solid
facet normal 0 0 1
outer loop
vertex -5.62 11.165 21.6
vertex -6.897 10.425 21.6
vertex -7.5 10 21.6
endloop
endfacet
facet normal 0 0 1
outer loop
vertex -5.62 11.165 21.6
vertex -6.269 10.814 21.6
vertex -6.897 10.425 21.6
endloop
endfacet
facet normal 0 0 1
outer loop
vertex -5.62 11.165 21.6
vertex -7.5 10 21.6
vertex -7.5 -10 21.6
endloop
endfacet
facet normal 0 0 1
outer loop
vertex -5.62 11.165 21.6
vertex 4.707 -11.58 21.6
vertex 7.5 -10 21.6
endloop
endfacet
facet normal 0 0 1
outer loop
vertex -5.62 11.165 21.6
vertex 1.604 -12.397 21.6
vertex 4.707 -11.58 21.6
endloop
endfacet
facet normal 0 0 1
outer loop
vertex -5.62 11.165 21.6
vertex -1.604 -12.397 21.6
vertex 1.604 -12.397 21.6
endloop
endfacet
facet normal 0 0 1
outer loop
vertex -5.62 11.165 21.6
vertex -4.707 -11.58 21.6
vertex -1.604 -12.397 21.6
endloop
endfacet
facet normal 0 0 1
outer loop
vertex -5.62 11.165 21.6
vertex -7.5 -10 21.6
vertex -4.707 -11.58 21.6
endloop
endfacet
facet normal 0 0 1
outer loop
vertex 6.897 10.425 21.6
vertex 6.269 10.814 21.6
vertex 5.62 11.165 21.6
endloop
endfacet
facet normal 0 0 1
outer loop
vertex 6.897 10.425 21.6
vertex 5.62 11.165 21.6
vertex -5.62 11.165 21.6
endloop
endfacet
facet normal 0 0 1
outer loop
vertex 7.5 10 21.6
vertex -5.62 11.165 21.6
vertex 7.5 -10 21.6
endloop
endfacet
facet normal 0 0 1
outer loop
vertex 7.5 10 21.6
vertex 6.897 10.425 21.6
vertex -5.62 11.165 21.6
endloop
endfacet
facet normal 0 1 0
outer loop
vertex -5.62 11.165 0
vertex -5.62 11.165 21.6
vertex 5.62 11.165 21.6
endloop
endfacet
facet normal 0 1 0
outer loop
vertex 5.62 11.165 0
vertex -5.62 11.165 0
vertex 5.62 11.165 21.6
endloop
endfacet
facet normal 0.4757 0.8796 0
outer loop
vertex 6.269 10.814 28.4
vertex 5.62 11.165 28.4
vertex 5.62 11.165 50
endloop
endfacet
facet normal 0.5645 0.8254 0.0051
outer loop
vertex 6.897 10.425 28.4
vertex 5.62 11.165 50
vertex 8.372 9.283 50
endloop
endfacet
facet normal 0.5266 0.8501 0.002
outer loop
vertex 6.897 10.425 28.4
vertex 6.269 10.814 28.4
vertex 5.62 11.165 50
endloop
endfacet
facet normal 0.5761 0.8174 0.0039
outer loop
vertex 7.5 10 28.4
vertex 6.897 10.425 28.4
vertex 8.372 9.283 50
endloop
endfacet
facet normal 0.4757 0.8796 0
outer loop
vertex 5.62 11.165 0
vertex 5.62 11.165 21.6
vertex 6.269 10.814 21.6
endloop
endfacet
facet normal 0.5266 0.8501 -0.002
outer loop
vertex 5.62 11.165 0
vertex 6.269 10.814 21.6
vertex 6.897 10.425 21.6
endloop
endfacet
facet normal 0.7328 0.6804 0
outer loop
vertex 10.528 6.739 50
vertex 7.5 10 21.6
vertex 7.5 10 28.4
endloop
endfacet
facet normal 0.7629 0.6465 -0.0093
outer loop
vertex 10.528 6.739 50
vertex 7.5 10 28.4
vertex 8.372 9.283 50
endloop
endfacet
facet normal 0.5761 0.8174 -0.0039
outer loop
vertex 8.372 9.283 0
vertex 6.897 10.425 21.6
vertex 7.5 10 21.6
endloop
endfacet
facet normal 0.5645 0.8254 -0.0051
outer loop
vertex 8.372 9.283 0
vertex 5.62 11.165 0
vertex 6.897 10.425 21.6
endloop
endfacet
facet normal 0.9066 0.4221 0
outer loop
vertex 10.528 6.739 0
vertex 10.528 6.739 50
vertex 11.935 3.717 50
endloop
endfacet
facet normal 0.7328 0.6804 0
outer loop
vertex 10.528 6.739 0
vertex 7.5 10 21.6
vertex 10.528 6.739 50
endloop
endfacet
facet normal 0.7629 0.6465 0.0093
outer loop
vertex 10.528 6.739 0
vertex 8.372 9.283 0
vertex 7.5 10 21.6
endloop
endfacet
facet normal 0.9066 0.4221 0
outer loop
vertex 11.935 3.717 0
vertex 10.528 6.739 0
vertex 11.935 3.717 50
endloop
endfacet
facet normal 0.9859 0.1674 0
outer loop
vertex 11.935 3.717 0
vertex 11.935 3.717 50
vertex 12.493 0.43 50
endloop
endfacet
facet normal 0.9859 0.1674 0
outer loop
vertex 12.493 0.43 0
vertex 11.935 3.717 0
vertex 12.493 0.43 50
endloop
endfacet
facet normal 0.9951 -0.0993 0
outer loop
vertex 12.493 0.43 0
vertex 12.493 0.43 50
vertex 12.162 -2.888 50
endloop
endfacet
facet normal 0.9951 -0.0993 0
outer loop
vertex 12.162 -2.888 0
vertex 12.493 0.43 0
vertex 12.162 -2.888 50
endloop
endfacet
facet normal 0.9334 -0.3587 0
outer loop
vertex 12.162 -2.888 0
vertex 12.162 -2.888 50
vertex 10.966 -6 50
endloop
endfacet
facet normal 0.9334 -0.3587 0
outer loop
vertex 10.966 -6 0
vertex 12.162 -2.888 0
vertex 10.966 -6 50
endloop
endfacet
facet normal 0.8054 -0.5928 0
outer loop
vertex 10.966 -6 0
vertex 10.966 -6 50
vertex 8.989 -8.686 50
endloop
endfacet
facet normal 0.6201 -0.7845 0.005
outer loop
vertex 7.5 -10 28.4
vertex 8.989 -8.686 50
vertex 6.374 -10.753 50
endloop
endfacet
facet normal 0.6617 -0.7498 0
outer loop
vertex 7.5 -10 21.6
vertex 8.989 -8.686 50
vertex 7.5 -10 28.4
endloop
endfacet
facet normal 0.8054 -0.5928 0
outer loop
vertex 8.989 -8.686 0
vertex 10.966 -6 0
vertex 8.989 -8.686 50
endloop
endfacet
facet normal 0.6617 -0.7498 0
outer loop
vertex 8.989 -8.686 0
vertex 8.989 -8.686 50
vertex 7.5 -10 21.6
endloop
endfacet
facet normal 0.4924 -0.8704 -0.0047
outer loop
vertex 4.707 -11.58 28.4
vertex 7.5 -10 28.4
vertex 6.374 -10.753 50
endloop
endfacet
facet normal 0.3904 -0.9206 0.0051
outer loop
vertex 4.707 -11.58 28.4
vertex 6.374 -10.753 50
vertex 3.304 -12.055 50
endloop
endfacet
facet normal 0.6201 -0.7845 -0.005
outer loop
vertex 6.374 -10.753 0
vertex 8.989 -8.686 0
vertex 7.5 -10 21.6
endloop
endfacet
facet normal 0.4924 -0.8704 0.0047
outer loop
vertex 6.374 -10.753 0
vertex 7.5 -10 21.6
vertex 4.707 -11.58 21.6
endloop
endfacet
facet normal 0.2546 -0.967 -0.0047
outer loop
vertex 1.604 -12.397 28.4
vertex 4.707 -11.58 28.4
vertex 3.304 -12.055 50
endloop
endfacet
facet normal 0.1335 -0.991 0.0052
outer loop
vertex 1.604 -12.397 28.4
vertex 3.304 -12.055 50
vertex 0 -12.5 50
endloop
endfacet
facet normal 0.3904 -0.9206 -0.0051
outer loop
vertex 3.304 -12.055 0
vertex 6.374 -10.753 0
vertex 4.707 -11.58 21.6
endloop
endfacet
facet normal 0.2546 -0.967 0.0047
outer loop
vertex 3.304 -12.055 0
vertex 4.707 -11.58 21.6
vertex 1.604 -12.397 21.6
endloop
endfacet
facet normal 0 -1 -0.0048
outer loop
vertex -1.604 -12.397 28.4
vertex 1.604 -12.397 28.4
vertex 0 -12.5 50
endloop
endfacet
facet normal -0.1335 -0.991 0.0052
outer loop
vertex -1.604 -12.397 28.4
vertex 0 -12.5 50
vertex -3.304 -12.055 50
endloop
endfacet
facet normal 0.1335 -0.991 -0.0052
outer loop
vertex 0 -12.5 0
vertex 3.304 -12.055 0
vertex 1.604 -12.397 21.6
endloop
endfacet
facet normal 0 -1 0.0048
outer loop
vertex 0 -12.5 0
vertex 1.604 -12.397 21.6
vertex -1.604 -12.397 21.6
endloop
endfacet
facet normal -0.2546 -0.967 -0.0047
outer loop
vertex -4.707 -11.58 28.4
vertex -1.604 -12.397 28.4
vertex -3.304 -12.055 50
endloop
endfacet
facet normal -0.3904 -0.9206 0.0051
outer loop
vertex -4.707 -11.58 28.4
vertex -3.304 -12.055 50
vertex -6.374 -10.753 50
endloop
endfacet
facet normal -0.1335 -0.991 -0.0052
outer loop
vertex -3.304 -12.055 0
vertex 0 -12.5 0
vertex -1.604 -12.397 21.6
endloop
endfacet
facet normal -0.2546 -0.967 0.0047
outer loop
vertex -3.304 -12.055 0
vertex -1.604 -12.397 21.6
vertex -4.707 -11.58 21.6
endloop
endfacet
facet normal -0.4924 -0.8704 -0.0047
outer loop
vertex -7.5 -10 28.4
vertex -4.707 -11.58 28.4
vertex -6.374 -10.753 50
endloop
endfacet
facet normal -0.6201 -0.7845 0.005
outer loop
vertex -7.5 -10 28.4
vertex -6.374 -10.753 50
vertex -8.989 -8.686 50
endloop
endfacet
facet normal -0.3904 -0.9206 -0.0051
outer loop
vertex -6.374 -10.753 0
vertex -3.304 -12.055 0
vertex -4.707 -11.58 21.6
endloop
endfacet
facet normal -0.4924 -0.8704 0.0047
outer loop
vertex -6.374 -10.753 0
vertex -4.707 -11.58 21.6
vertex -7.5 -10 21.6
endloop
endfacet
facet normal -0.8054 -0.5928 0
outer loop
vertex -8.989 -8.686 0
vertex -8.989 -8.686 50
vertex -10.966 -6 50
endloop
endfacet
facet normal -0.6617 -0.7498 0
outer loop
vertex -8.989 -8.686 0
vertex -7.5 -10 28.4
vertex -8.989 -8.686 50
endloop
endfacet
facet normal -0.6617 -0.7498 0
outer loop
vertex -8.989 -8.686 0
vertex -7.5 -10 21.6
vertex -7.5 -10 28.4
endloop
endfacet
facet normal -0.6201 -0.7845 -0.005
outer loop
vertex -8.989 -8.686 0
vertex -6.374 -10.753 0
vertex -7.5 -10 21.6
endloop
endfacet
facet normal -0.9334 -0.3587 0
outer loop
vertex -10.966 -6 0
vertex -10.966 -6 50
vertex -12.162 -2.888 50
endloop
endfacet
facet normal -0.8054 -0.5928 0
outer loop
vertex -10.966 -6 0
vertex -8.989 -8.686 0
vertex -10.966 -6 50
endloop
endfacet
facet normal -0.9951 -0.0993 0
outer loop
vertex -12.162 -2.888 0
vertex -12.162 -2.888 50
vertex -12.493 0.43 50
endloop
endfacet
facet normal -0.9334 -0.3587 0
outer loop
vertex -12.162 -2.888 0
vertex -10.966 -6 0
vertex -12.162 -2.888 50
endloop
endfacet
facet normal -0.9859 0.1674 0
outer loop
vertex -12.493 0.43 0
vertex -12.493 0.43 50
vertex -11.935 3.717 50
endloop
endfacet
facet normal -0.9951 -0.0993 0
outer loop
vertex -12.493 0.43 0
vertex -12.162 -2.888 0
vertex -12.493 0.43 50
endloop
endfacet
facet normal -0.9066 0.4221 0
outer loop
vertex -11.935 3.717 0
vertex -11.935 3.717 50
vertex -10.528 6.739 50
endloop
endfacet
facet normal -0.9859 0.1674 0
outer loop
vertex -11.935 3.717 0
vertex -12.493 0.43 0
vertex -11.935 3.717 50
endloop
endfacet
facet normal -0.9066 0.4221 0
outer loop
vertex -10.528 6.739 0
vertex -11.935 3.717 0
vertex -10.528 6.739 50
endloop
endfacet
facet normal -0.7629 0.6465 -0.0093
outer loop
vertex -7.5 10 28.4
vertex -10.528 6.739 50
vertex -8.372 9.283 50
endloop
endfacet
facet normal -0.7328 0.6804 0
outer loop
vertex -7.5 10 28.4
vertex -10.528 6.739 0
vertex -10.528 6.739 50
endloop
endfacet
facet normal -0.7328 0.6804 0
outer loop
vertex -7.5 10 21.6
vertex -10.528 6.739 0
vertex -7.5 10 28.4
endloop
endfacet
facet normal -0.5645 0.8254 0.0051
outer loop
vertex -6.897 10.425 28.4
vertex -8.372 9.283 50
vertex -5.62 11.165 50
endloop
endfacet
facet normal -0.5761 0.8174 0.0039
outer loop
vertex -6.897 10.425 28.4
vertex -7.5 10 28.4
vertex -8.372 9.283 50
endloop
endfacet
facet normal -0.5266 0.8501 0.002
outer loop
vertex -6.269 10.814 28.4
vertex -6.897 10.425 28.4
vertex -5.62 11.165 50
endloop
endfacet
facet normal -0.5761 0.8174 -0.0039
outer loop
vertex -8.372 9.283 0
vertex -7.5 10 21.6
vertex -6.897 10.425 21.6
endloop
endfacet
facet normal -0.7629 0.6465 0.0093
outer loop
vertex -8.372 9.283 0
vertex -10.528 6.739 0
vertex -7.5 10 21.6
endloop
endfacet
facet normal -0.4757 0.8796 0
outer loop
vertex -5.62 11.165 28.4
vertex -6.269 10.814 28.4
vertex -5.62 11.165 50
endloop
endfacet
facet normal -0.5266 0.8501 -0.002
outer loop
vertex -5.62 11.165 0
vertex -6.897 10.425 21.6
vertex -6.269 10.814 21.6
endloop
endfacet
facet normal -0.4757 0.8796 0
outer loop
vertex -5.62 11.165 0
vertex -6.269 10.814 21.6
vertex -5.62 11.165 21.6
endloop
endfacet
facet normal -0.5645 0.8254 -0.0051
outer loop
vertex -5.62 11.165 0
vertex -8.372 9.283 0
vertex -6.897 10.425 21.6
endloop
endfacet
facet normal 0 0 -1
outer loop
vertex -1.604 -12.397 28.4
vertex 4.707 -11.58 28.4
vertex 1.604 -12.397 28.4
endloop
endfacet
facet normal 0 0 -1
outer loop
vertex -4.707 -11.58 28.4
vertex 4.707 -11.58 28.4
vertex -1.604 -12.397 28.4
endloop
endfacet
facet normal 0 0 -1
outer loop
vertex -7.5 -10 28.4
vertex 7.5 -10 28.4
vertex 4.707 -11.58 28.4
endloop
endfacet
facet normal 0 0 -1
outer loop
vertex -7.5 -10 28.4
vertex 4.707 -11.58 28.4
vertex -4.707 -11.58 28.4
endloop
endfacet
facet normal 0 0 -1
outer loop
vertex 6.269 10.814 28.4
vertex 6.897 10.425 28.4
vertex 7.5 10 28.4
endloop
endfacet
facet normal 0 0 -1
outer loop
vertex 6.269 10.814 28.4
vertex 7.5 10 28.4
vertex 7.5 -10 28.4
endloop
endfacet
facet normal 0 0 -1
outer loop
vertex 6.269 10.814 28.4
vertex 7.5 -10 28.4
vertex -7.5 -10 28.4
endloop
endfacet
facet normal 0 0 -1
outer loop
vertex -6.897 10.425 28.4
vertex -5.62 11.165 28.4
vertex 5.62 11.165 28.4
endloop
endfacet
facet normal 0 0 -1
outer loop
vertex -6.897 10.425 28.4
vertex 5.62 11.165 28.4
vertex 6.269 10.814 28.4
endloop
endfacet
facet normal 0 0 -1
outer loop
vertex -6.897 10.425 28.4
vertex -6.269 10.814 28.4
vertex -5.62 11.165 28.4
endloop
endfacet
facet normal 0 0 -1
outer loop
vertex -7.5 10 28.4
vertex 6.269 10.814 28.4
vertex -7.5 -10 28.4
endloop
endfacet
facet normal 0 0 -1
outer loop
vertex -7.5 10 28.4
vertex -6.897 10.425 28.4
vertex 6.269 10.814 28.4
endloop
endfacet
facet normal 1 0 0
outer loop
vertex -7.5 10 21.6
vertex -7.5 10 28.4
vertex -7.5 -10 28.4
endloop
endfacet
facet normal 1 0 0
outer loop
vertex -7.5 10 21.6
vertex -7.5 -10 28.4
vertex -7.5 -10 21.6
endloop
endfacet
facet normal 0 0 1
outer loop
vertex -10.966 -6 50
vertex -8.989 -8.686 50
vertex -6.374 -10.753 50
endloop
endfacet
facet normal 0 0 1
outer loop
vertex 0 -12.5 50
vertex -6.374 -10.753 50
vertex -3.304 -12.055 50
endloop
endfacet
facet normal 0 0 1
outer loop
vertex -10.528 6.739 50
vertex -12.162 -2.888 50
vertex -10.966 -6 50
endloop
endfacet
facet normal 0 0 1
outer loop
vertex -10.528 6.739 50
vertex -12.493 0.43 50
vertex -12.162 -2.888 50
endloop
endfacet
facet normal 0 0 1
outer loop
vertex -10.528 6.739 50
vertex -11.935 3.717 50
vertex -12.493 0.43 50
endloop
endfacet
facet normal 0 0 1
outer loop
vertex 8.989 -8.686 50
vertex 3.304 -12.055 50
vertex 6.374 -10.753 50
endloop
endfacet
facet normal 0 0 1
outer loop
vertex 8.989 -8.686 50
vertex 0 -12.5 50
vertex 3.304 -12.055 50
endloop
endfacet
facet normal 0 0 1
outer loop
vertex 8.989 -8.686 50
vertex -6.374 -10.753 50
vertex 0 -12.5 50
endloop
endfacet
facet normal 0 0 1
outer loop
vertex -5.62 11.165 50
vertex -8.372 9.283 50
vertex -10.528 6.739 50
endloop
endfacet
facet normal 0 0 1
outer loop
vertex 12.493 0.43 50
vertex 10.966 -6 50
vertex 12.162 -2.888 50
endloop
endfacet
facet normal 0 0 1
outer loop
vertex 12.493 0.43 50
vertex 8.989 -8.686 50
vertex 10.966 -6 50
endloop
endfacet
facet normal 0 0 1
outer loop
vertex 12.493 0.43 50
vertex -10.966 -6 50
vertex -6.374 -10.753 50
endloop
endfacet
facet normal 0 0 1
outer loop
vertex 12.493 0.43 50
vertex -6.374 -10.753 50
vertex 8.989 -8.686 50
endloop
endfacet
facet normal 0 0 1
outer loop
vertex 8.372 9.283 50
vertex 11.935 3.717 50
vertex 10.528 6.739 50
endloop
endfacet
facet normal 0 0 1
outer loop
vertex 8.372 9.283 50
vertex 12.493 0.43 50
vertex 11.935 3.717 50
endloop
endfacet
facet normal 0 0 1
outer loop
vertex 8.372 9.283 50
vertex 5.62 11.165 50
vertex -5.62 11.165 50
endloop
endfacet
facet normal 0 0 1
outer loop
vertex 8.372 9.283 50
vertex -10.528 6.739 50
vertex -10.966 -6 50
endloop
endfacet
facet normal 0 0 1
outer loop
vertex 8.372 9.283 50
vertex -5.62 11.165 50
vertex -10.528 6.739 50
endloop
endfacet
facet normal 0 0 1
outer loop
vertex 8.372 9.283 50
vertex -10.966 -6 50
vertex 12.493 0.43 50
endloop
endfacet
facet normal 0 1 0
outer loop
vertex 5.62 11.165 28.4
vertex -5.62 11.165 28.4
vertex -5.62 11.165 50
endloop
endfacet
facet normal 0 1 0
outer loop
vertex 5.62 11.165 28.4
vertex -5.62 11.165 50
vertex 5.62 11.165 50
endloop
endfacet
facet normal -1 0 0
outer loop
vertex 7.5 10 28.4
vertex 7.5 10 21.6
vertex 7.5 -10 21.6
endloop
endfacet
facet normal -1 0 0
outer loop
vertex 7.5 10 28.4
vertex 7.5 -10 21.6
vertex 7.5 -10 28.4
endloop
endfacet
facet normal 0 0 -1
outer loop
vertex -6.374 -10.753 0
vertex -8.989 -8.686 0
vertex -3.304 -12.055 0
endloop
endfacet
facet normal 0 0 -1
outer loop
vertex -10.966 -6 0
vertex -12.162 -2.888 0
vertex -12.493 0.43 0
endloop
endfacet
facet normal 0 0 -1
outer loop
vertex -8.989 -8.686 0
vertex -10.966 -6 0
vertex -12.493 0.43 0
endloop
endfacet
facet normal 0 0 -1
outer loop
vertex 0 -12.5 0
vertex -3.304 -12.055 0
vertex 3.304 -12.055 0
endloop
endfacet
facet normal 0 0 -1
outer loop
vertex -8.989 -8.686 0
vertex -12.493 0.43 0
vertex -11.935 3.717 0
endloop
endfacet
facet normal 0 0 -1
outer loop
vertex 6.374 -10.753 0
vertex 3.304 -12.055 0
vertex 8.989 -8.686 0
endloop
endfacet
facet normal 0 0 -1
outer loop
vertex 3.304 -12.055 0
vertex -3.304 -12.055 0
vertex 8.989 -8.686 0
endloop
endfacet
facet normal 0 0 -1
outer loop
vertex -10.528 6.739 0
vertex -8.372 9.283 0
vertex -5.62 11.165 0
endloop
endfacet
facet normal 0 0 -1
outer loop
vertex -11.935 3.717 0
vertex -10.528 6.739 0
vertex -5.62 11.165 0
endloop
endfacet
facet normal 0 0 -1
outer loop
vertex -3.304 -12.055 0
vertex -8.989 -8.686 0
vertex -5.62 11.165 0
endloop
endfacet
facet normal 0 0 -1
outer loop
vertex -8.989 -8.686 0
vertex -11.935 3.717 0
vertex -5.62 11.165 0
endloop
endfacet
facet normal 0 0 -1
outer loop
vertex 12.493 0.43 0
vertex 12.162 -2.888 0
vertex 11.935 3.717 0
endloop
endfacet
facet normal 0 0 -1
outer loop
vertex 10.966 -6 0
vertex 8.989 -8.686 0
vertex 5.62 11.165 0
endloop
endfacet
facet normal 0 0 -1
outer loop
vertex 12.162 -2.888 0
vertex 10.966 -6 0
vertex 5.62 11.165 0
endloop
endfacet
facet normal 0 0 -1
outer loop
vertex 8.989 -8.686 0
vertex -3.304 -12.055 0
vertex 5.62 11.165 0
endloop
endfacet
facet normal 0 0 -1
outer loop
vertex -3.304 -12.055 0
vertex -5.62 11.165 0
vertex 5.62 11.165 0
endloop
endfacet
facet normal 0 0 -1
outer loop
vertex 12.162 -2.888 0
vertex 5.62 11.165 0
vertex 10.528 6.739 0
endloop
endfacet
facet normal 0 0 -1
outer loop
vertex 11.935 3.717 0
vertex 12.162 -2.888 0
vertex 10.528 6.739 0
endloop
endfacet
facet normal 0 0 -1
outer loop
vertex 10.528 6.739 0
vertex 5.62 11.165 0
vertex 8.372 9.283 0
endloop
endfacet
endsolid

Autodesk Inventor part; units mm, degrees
ref_plane "YZ Plane" through (0, 0, 0) normal (1, 0, 0) x (0, 1, 0)
ref_plane "XZ Plane" through (0, 0, 0) normal (0, 1, 0) x (-1, 0, 0)
ref_plane "XY Plane" through (0, 0, 0) normal (0, 0, 1) x (1, 0, 0)
sketch "Sketch12" plane through (0, 0, 0) normal (0, 0, 1) x (1, 0, 0)
  circle A0 centre (0, 0) radius 12.5
  dimension "d22" = 25
extrude "Extrusion3" add sketch "Sketch12" along normal blind 50
sketch "Sketch15" plane through (0, 0, 50) normal (0, 0, 1) x (1, 0, 0)
  circle A0 centre (0, 0) radius 12.5 projected
  line L0 (-5.6199, 11.1654) -> (6.24, 11.1654)
  line L1 (6.24, 11.1654) -> (6.24, 16.8143)
  line L2 (6.24, 16.8143) -> (-5.6199, 16.8143)
  line L3 (-5.6199, 16.8143) -> (-5.6199, 11.1654)
extrude "Extrusion4" cut sketch "Sketch15" against normal blind 64.3 contours L3 L2 L1 L0 A0 | A0 L0 picked at (0.9627, 11.4975)
sketch "Sketch17" plane through (-5.6199, 11.1654, 50) normal (0, 1, 0) x (1, 0, 0)
  point P0 (5.6199, 50)
sketch "Sketch18" plane through (-5.6199, 11.1654, 50) normal (0, 1, 0) x (1, 0, 0)
  line L0 (-1.8801, 28.4) -> (13.1199, 28.4)
  line L1 (13.1199, 28.4) -> (13.1199, 21.6)
  line L2 (13.1199, 21.6) -> (-1.8801, 21.6)
  line L3 (-1.8801, 21.6) -> (-1.8801, 28.4)
  line L4 (-1.8801, 28.4) -> (13.1199, 21.6) construction
  line L5 (13.1199, 28.4) -> (-1.8801, 21.6) construction
  point P0 (5.6199, 50)
  point P1 (5.6199, 25)
  dimension "d30" = 15
  dimension "d31" = 6.8
extrude "Extrusion6" cut sketch "Sketch18" against normal blind 28.2625
properties part number "foot"
